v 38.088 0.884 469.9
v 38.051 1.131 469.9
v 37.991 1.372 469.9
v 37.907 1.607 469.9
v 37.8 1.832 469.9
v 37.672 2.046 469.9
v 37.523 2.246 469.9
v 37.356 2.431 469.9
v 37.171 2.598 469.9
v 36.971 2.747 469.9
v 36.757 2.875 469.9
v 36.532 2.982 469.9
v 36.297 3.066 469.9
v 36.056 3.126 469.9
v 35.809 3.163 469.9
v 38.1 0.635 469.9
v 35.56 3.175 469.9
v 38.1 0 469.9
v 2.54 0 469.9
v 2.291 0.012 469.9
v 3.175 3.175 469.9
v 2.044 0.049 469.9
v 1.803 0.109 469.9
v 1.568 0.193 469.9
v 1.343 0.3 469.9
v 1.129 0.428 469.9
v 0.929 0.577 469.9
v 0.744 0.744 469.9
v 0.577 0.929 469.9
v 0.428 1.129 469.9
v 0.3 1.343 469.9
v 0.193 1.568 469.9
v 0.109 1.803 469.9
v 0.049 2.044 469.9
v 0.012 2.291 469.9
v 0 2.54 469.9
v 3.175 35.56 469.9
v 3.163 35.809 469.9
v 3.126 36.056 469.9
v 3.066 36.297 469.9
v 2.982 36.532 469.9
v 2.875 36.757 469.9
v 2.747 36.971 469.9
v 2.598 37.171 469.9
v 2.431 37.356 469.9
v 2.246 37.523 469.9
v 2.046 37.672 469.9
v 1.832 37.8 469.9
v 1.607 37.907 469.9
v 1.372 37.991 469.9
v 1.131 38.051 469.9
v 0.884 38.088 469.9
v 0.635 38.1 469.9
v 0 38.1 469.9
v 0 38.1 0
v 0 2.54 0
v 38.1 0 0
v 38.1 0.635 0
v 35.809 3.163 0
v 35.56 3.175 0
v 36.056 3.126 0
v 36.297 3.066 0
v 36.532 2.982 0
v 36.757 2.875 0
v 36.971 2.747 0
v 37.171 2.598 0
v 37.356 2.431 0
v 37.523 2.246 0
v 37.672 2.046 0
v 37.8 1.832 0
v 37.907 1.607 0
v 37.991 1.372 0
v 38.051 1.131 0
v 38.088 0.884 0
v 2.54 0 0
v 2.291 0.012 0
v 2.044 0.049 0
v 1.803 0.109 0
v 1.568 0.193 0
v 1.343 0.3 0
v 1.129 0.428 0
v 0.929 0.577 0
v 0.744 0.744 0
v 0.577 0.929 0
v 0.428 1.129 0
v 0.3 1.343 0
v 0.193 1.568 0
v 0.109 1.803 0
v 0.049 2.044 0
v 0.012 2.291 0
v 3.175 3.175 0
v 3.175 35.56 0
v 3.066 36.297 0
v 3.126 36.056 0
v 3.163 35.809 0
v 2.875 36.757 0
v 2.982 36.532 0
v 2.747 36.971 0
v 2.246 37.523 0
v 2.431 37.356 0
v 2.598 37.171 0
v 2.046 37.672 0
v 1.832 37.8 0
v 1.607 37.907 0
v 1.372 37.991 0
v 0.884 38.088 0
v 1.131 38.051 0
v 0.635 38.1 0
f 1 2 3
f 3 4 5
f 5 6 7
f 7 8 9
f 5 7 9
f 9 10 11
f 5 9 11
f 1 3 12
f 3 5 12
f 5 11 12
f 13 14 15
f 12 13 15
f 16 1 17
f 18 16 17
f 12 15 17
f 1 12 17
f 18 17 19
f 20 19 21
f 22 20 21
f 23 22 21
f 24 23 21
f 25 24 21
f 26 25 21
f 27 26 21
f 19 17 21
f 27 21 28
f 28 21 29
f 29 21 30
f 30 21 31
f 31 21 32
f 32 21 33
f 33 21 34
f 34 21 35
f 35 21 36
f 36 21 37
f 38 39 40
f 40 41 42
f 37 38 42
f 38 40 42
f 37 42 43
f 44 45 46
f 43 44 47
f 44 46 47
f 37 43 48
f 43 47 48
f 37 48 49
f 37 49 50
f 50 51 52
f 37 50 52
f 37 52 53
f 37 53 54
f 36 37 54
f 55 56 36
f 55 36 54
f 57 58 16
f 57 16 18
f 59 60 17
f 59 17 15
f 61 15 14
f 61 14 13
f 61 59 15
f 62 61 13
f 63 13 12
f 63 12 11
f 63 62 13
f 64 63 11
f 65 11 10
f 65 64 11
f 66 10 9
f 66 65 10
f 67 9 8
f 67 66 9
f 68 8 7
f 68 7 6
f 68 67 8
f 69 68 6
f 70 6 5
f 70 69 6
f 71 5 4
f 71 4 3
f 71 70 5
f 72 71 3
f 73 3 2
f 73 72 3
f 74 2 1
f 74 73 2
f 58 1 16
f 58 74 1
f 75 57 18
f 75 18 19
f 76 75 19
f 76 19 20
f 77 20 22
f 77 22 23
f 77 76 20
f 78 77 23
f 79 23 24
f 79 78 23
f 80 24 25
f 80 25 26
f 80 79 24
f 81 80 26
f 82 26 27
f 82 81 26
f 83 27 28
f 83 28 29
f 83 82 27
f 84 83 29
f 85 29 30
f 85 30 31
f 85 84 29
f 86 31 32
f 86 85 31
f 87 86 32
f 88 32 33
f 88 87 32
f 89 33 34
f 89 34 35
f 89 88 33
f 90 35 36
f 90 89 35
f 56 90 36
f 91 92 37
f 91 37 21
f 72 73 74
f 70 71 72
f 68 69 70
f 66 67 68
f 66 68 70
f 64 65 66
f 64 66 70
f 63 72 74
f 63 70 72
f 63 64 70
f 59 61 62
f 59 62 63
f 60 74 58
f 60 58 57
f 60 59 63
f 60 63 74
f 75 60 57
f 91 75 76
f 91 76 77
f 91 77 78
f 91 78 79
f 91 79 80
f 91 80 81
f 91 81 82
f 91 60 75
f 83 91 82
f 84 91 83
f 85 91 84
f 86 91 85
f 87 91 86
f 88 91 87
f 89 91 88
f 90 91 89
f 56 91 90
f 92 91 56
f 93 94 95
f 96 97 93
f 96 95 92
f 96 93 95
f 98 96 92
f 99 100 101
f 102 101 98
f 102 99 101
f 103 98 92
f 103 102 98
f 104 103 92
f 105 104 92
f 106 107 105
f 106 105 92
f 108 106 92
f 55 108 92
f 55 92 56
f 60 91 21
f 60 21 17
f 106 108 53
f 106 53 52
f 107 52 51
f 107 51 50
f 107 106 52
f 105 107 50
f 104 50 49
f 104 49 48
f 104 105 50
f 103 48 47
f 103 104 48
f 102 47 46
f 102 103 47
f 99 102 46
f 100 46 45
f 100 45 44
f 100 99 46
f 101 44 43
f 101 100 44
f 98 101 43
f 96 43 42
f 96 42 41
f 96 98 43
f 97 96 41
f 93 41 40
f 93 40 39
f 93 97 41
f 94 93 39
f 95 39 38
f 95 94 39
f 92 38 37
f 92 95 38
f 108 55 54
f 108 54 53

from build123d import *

# Parameters (mm, degrees)
BOSS_EXTRUDE1_DEPTH = 469.9


with BuildPart() as part:
    # Sketch1 → Boss-Extrude1 (new body)
    with BuildSketch(Plane.XY):
        with BuildLine():
            Line((0, 2.54), (0, 38.1))
            Line((0, 38.1), (0.635, 38.1))
            ThreePointArc((0.635, 38.1), (2.431051224, 37.356051224), (3.175, 35.56))
            Line((3.175, 35.56), (3.175, 3.175))
            Line((3.175, 3.175), (35.56, 3.175))
            ThreePointArc((35.56, 3.175), (37.356051224, 2.431051224), (38.1, 0.635))
            Line((38.1, 0.635), (38.1, 0))
            Line((38.1, 0), (2.54, 0))
            ThreePointArc((2.54, 0), (0.743948776, 0.743948776), (0, 2.54))
        make_face()
    extrude(amount=BOSS_EXTRUDE1_DEPTH)


solid = part.part
